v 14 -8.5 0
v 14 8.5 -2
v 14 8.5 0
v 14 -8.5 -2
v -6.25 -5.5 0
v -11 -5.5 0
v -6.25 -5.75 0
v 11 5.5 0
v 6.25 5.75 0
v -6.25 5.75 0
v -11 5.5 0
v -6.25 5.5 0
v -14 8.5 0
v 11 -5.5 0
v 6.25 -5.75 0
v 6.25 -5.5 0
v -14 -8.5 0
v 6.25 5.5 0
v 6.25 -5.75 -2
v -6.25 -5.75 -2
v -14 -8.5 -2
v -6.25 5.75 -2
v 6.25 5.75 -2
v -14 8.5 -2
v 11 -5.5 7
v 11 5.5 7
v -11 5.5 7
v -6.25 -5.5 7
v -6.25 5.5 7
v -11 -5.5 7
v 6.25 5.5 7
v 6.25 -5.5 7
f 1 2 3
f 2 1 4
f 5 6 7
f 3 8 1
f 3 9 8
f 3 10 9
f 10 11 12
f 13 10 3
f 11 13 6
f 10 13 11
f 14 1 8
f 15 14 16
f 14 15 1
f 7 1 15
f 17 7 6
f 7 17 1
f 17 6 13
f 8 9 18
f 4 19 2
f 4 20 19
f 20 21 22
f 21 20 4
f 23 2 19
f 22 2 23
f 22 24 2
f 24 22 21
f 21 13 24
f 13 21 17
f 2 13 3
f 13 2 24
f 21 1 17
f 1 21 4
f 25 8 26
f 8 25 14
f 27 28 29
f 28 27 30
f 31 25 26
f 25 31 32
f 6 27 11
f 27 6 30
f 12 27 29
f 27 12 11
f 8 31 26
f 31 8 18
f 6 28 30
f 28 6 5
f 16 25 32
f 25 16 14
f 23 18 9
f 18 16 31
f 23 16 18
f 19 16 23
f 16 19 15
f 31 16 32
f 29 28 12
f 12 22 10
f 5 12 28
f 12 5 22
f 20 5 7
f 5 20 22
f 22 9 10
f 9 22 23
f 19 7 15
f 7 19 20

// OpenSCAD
$fn  = 50;

width = 18;
height = 7;

boxOverlap = 10;
boxThickness = 2;
boxDepth = 3;
boxKragen = 1.6;
boxFloorThickness = 3;

woodWidth = 3.6;

clipWidth = 4;
clipNoseThickness = 1.3;
clipLength = 3;

box();

module solidBox() {
    
    // kragen
    translate([0,0,-boxThickness/2]) cube([width + boxOverlap, height + boxOverlap, boxThickness], true);
 
    // durchführung
    translate([0, 0, (boxDepth)/2+2]) cube([width + boxThickness * 2, height + boxThickness * 2, boxDepth + 4], true); 
    
    translate([0,3.5,boxDepth + 2]) cube([width + boxThickness * 2,2.4,4], true); 
    
    translate([0,-3.5,boxDepth + 2]) cube([width + boxThickness * 2,2.4,4], true); 
    
    //for(n = [-1,1])
    //for(i = [-1,1])
    //translate([i * width/(5 + n),n * (height/2 + boxThickness),woodWidth]) rotate([90,0,n*90]) linear_extrude(height = clipWidth, center=true) polygon([
    //        [0, clipLength],
    //        [0, 0],
    //        [clipNoseThickness, 0]        
    //    ]);  

}


module box() {      
   difference() { 
      solidBox();
             
      // oberer teil
      //translate([-width/2,-height/2,-boxThickness]) cube([width, height, boxDepth]);    
            
      // usb slot
      translate([0,0,boxDepth-boxFloorThickness/2]) cube([12.5,11.5,20], true); 
      //translate([0,1.7,boxDepth + 0.4]) cube([20,1.2,20], true); 
   }   
   
}
